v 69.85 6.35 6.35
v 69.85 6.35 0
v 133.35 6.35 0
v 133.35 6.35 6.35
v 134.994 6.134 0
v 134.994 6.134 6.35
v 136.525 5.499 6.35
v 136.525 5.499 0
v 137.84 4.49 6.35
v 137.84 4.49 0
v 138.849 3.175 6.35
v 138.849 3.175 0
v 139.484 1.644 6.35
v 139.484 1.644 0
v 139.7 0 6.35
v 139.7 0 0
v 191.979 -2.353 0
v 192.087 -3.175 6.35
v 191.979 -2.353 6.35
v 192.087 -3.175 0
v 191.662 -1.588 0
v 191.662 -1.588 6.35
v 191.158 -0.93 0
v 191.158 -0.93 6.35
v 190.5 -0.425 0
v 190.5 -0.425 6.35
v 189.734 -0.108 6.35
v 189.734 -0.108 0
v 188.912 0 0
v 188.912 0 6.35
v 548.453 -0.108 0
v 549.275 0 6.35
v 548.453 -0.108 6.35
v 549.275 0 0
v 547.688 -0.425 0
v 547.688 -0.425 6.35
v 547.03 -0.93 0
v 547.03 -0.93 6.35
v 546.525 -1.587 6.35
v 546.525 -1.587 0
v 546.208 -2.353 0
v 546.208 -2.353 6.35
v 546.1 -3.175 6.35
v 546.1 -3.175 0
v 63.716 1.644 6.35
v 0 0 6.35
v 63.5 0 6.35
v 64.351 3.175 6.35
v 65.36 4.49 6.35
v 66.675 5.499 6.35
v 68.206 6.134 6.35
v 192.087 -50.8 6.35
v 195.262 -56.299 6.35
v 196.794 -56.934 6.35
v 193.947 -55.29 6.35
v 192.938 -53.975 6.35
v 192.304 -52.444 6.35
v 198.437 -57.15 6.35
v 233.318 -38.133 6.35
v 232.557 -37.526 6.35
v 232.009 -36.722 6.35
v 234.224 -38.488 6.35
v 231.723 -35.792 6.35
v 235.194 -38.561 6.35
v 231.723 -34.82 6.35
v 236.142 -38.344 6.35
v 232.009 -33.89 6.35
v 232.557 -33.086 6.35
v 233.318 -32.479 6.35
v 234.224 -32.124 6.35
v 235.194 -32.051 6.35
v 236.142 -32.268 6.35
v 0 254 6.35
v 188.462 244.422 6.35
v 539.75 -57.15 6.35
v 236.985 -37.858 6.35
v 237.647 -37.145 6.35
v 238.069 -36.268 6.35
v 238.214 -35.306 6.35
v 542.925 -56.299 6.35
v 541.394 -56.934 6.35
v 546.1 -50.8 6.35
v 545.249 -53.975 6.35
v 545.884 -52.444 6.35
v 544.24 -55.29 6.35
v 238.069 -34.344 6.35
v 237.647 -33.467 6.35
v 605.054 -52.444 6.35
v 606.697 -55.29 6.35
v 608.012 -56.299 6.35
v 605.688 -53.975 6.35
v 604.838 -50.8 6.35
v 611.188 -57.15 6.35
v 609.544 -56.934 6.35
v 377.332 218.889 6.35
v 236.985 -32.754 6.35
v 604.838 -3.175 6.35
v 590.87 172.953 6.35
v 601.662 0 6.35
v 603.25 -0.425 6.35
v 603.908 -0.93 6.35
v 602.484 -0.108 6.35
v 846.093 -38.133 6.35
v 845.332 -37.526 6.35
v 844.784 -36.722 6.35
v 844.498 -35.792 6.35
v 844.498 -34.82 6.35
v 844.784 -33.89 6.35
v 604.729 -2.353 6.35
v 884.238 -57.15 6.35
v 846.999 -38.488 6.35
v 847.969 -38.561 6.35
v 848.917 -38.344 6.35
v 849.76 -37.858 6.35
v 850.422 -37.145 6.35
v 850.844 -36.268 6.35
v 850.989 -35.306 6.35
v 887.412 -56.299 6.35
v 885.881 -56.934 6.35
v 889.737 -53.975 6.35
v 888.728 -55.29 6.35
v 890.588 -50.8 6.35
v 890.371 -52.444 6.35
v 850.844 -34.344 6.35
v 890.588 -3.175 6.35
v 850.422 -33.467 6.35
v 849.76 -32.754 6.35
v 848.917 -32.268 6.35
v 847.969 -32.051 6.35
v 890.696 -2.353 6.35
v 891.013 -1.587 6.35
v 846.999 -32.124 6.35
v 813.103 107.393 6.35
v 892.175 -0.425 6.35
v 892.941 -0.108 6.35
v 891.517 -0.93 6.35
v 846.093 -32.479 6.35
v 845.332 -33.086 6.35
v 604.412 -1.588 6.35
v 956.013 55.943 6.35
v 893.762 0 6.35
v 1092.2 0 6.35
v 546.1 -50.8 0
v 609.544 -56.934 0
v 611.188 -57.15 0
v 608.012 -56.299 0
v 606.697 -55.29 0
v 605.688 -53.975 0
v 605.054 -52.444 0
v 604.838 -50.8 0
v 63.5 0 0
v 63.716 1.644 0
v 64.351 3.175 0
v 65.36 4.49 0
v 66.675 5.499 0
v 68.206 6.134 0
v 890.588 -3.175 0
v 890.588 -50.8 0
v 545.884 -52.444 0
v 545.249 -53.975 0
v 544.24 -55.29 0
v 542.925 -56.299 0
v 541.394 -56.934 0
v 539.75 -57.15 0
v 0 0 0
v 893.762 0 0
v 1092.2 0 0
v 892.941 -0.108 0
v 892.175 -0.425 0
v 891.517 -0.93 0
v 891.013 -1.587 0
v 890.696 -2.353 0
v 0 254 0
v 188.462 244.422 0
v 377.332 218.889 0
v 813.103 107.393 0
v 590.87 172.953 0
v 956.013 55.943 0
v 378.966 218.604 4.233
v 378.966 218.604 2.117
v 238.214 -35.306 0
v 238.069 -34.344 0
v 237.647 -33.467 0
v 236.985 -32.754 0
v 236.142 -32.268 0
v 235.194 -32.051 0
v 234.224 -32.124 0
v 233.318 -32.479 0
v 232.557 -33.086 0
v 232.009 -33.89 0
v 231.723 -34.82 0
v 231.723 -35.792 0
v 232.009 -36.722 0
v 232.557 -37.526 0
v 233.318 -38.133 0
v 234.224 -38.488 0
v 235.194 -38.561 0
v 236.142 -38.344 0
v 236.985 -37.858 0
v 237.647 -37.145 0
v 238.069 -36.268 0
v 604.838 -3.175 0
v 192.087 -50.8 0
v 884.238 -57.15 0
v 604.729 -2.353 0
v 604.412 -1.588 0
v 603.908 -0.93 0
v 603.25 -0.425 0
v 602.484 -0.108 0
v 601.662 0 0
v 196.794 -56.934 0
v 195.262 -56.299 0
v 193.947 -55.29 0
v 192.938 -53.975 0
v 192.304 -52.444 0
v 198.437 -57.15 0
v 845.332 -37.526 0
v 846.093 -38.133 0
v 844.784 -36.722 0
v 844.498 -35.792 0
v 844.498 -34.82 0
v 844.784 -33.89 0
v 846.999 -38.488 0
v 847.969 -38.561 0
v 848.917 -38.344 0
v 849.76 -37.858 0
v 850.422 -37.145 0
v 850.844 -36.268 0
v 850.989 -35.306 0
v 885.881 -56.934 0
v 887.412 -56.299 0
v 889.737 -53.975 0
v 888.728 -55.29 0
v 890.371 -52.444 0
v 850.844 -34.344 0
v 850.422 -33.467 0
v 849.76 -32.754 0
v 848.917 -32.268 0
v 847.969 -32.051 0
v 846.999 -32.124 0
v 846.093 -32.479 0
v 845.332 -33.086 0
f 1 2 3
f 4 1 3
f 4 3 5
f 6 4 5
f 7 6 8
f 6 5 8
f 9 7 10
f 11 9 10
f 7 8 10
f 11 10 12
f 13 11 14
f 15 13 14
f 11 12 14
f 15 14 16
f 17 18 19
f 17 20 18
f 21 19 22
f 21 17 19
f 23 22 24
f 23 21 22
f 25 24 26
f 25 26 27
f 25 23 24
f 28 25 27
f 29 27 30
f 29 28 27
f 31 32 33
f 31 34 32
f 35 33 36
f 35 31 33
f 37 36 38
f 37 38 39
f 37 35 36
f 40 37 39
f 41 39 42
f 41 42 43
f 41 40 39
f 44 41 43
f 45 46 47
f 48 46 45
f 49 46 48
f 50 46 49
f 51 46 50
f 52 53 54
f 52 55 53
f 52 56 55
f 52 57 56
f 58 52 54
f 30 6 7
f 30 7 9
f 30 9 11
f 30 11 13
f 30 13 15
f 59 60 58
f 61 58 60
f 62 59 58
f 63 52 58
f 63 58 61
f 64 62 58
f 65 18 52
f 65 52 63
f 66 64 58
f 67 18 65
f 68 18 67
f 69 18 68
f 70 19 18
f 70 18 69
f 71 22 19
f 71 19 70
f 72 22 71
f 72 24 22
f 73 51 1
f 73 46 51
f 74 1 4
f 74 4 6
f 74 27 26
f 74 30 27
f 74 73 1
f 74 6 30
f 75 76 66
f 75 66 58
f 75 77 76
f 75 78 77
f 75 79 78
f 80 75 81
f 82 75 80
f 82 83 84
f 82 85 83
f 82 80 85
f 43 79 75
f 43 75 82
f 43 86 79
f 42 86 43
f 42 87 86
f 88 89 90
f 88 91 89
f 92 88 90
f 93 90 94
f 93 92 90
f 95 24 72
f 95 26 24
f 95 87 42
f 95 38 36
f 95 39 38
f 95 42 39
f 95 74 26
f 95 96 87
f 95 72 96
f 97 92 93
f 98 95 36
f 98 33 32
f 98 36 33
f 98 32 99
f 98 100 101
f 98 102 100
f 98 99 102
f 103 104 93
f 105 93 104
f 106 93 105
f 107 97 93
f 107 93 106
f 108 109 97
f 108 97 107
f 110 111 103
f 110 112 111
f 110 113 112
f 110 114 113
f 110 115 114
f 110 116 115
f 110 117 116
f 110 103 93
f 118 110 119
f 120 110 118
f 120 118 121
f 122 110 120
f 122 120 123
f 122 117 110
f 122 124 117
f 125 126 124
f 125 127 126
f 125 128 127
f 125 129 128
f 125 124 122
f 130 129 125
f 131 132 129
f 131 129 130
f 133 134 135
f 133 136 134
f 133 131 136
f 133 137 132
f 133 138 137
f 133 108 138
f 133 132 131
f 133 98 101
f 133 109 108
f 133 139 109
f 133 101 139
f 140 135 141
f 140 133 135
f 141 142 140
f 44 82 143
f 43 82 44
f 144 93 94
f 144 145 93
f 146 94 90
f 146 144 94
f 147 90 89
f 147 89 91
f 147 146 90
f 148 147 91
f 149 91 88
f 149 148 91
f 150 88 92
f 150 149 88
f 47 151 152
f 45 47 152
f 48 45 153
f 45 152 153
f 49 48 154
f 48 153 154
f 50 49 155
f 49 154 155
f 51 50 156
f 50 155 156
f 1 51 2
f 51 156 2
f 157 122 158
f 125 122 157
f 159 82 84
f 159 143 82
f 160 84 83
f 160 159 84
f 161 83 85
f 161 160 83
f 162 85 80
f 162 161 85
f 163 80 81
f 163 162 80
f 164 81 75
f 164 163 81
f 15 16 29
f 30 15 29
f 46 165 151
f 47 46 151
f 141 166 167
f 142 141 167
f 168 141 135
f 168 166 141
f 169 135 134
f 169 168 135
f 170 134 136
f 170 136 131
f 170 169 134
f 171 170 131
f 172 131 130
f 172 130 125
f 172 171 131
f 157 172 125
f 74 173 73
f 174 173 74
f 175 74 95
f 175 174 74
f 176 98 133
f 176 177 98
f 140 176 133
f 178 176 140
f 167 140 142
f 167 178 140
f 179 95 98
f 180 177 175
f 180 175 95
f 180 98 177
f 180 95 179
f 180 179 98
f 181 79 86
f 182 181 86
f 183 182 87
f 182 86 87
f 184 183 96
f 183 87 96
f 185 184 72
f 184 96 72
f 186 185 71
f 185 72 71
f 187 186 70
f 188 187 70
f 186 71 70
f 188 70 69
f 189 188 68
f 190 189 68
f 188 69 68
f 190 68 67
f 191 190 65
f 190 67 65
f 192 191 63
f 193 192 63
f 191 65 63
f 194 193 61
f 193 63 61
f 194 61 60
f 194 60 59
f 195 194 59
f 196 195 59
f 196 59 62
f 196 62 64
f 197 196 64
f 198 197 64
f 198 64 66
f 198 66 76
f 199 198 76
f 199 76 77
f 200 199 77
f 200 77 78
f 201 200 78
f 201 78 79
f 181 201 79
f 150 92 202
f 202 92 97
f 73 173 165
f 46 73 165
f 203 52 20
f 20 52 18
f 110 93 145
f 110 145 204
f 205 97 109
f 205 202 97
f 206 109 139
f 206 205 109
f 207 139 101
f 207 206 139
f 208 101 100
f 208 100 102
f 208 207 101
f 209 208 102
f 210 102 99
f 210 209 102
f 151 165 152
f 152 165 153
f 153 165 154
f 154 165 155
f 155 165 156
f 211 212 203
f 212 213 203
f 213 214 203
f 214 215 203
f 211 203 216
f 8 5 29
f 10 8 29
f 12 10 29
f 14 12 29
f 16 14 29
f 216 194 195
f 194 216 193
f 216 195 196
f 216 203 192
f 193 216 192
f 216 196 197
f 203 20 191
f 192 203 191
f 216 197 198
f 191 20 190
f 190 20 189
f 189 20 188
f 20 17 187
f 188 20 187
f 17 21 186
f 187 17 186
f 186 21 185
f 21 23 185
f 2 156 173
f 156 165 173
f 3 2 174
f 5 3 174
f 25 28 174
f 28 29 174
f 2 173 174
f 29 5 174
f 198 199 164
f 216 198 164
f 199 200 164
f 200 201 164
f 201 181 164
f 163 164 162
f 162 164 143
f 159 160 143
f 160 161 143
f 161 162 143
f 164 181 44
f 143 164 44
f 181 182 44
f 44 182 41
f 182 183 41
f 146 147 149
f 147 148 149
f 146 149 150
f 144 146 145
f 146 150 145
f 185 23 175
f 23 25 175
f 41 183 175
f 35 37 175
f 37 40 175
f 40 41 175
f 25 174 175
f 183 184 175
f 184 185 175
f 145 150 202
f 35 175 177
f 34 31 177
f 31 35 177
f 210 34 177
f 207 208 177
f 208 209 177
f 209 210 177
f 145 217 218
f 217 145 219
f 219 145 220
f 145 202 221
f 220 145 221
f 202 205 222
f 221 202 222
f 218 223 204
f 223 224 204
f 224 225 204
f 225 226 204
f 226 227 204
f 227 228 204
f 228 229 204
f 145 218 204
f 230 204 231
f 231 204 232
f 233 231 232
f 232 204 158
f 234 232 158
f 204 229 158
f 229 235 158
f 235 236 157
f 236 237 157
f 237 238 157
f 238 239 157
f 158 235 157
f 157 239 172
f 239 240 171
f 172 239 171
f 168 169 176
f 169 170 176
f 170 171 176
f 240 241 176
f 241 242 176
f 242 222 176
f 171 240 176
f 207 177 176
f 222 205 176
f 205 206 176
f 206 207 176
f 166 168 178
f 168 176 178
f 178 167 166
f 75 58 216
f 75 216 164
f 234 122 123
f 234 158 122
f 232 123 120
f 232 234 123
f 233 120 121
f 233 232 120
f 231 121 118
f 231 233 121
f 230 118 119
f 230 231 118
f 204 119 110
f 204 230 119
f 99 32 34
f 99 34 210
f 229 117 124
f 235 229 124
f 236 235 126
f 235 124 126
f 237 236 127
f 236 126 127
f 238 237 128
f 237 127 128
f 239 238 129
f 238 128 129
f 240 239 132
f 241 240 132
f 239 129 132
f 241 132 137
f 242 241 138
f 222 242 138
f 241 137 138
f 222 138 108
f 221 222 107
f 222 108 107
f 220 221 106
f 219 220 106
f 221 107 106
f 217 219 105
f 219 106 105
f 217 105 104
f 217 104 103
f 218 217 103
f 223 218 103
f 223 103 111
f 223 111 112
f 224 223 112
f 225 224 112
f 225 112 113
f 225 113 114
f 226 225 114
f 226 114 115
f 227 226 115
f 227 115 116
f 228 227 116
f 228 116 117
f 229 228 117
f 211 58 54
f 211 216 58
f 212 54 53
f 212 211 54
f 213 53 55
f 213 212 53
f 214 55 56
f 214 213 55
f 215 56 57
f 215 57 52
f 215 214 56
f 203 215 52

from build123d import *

# Parameters (mm, degrees)
BOSS_EXTRUDE1_DEPTH      = 6.35
CUT_EXTRUDE2_DEPTH       = 7.3500001
SKETCH8_W                = 698.5
SKETCH8_H                = 57.15
BOSS_EXTRUDE3_DEPTH      = 6.35
SKETCH12_W               = 58.7375
SKETCH12_H               = 57.15
CUT_EXTRUDE3_DEPTH       = 7.3500001
FILLET2_R                = 3.175
FILLET3_R                = 6.35
F_0_257_DIAMETER_HOLE2_D = 6.5278


with BuildPart() as part:
    # Sketch1 → Boss-Extrude1 (new body)
    with BuildSketch(Plane.XY):
        with BuildLine():
            Line((0, 254), (0, 0))
            Line((0, 0), (1092.2, 0))
            add(Edge.make_bspline(
                [(0, 254), (376.513153864, 252.276375478), (770.285770075, 140.499670678), (1092.2, 0)],
                knots=[0, 0, 0, 0, 1, 1, 1, 1], degree=3))
        make_face()
    extrude(amount=BOSS_EXTRUDE1_DEPTH)

    # Sketch7 → Cut-Extrude2 (cut, through all)
    with BuildSketch(Plane(origin=(0, 0, 0), x_dir=(-1, 0, 0), z_dir=(0, 0, -1))):
        with BuildLine():
            Line((-133.35, 0), (-63.5, 0))
            ThreePointArc((-63.5, 0), (-65.359871939, 4.490128061), (-69.85, 6.35))
            Line((-69.85, 6.35), (-133.35, 6.35))
            ThreePointArc((-133.35, 6.35), (-137.840128061, 4.490128061), (-139.7, 0))
            Line((-139.7, 0), (-133.35, 0))
        make_face()
    extrude(amount=-CUT_EXTRUDE2_DEPTH, mode=Mode.SUBTRACT)

    # Sketch8 → Boss-Extrude3 (add)
    with BuildSketch(Plane.XY.offset(6.35)):
        with Locations((541.3375, -28.575)):
            Rectangle(SKETCH8_W, SKETCH8_H)
    extrude(amount=-BOSS_EXTRUDE3_DEPTH)

    # Sketch12 → Cut-Extrude3 (cut, through all)
    with BuildSketch(Plane.XY.offset(6.35)):
        with Locations((575.46875, -28.575)):
            Rectangle(SKETCH12_W, SKETCH12_H)
    extrude(amount=-CUT_EXTRUDE3_DEPTH, mode=Mode.SUBTRACT)

    # Fillet2
    fillet2_edges = [part.edges().sort_by_distance(p)[0] for p in [
        (192.0875, 0, 3.175),
        (890.5875, 0, 3.175),
        (604.8375, 0, 3.175),
        (546.1, 0, 3.175),
    ]]
    fillet(fillet2_edges, radius=FILLET2_R)

    # Fillet3
    fillet3_edges = [part.edges().sort_by_distance(p)[0] for p in [
        (192.0875, -57.15, 3.175),
        (890.5875, -57.15, 3.175),
        (604.8375, -57.15, 3.175),
        (546.1, -57.15, 3.175),
    ]]
    fillet(fillet3_edges, radius=FILLET3_R)

    # F (0.257) Diameter Hole2 (through all)
    with Locations(Plane(origin=(0, 0, 0), x_dir=(-1, 0, 0), z_dir=(0, 0, -1))):
        with Locations((-847.725, -35.306), (-234.95, -35.306)):
            Hole(F_0_257_DIAMETER_HOLE2_D / 2)


solid = part.part
